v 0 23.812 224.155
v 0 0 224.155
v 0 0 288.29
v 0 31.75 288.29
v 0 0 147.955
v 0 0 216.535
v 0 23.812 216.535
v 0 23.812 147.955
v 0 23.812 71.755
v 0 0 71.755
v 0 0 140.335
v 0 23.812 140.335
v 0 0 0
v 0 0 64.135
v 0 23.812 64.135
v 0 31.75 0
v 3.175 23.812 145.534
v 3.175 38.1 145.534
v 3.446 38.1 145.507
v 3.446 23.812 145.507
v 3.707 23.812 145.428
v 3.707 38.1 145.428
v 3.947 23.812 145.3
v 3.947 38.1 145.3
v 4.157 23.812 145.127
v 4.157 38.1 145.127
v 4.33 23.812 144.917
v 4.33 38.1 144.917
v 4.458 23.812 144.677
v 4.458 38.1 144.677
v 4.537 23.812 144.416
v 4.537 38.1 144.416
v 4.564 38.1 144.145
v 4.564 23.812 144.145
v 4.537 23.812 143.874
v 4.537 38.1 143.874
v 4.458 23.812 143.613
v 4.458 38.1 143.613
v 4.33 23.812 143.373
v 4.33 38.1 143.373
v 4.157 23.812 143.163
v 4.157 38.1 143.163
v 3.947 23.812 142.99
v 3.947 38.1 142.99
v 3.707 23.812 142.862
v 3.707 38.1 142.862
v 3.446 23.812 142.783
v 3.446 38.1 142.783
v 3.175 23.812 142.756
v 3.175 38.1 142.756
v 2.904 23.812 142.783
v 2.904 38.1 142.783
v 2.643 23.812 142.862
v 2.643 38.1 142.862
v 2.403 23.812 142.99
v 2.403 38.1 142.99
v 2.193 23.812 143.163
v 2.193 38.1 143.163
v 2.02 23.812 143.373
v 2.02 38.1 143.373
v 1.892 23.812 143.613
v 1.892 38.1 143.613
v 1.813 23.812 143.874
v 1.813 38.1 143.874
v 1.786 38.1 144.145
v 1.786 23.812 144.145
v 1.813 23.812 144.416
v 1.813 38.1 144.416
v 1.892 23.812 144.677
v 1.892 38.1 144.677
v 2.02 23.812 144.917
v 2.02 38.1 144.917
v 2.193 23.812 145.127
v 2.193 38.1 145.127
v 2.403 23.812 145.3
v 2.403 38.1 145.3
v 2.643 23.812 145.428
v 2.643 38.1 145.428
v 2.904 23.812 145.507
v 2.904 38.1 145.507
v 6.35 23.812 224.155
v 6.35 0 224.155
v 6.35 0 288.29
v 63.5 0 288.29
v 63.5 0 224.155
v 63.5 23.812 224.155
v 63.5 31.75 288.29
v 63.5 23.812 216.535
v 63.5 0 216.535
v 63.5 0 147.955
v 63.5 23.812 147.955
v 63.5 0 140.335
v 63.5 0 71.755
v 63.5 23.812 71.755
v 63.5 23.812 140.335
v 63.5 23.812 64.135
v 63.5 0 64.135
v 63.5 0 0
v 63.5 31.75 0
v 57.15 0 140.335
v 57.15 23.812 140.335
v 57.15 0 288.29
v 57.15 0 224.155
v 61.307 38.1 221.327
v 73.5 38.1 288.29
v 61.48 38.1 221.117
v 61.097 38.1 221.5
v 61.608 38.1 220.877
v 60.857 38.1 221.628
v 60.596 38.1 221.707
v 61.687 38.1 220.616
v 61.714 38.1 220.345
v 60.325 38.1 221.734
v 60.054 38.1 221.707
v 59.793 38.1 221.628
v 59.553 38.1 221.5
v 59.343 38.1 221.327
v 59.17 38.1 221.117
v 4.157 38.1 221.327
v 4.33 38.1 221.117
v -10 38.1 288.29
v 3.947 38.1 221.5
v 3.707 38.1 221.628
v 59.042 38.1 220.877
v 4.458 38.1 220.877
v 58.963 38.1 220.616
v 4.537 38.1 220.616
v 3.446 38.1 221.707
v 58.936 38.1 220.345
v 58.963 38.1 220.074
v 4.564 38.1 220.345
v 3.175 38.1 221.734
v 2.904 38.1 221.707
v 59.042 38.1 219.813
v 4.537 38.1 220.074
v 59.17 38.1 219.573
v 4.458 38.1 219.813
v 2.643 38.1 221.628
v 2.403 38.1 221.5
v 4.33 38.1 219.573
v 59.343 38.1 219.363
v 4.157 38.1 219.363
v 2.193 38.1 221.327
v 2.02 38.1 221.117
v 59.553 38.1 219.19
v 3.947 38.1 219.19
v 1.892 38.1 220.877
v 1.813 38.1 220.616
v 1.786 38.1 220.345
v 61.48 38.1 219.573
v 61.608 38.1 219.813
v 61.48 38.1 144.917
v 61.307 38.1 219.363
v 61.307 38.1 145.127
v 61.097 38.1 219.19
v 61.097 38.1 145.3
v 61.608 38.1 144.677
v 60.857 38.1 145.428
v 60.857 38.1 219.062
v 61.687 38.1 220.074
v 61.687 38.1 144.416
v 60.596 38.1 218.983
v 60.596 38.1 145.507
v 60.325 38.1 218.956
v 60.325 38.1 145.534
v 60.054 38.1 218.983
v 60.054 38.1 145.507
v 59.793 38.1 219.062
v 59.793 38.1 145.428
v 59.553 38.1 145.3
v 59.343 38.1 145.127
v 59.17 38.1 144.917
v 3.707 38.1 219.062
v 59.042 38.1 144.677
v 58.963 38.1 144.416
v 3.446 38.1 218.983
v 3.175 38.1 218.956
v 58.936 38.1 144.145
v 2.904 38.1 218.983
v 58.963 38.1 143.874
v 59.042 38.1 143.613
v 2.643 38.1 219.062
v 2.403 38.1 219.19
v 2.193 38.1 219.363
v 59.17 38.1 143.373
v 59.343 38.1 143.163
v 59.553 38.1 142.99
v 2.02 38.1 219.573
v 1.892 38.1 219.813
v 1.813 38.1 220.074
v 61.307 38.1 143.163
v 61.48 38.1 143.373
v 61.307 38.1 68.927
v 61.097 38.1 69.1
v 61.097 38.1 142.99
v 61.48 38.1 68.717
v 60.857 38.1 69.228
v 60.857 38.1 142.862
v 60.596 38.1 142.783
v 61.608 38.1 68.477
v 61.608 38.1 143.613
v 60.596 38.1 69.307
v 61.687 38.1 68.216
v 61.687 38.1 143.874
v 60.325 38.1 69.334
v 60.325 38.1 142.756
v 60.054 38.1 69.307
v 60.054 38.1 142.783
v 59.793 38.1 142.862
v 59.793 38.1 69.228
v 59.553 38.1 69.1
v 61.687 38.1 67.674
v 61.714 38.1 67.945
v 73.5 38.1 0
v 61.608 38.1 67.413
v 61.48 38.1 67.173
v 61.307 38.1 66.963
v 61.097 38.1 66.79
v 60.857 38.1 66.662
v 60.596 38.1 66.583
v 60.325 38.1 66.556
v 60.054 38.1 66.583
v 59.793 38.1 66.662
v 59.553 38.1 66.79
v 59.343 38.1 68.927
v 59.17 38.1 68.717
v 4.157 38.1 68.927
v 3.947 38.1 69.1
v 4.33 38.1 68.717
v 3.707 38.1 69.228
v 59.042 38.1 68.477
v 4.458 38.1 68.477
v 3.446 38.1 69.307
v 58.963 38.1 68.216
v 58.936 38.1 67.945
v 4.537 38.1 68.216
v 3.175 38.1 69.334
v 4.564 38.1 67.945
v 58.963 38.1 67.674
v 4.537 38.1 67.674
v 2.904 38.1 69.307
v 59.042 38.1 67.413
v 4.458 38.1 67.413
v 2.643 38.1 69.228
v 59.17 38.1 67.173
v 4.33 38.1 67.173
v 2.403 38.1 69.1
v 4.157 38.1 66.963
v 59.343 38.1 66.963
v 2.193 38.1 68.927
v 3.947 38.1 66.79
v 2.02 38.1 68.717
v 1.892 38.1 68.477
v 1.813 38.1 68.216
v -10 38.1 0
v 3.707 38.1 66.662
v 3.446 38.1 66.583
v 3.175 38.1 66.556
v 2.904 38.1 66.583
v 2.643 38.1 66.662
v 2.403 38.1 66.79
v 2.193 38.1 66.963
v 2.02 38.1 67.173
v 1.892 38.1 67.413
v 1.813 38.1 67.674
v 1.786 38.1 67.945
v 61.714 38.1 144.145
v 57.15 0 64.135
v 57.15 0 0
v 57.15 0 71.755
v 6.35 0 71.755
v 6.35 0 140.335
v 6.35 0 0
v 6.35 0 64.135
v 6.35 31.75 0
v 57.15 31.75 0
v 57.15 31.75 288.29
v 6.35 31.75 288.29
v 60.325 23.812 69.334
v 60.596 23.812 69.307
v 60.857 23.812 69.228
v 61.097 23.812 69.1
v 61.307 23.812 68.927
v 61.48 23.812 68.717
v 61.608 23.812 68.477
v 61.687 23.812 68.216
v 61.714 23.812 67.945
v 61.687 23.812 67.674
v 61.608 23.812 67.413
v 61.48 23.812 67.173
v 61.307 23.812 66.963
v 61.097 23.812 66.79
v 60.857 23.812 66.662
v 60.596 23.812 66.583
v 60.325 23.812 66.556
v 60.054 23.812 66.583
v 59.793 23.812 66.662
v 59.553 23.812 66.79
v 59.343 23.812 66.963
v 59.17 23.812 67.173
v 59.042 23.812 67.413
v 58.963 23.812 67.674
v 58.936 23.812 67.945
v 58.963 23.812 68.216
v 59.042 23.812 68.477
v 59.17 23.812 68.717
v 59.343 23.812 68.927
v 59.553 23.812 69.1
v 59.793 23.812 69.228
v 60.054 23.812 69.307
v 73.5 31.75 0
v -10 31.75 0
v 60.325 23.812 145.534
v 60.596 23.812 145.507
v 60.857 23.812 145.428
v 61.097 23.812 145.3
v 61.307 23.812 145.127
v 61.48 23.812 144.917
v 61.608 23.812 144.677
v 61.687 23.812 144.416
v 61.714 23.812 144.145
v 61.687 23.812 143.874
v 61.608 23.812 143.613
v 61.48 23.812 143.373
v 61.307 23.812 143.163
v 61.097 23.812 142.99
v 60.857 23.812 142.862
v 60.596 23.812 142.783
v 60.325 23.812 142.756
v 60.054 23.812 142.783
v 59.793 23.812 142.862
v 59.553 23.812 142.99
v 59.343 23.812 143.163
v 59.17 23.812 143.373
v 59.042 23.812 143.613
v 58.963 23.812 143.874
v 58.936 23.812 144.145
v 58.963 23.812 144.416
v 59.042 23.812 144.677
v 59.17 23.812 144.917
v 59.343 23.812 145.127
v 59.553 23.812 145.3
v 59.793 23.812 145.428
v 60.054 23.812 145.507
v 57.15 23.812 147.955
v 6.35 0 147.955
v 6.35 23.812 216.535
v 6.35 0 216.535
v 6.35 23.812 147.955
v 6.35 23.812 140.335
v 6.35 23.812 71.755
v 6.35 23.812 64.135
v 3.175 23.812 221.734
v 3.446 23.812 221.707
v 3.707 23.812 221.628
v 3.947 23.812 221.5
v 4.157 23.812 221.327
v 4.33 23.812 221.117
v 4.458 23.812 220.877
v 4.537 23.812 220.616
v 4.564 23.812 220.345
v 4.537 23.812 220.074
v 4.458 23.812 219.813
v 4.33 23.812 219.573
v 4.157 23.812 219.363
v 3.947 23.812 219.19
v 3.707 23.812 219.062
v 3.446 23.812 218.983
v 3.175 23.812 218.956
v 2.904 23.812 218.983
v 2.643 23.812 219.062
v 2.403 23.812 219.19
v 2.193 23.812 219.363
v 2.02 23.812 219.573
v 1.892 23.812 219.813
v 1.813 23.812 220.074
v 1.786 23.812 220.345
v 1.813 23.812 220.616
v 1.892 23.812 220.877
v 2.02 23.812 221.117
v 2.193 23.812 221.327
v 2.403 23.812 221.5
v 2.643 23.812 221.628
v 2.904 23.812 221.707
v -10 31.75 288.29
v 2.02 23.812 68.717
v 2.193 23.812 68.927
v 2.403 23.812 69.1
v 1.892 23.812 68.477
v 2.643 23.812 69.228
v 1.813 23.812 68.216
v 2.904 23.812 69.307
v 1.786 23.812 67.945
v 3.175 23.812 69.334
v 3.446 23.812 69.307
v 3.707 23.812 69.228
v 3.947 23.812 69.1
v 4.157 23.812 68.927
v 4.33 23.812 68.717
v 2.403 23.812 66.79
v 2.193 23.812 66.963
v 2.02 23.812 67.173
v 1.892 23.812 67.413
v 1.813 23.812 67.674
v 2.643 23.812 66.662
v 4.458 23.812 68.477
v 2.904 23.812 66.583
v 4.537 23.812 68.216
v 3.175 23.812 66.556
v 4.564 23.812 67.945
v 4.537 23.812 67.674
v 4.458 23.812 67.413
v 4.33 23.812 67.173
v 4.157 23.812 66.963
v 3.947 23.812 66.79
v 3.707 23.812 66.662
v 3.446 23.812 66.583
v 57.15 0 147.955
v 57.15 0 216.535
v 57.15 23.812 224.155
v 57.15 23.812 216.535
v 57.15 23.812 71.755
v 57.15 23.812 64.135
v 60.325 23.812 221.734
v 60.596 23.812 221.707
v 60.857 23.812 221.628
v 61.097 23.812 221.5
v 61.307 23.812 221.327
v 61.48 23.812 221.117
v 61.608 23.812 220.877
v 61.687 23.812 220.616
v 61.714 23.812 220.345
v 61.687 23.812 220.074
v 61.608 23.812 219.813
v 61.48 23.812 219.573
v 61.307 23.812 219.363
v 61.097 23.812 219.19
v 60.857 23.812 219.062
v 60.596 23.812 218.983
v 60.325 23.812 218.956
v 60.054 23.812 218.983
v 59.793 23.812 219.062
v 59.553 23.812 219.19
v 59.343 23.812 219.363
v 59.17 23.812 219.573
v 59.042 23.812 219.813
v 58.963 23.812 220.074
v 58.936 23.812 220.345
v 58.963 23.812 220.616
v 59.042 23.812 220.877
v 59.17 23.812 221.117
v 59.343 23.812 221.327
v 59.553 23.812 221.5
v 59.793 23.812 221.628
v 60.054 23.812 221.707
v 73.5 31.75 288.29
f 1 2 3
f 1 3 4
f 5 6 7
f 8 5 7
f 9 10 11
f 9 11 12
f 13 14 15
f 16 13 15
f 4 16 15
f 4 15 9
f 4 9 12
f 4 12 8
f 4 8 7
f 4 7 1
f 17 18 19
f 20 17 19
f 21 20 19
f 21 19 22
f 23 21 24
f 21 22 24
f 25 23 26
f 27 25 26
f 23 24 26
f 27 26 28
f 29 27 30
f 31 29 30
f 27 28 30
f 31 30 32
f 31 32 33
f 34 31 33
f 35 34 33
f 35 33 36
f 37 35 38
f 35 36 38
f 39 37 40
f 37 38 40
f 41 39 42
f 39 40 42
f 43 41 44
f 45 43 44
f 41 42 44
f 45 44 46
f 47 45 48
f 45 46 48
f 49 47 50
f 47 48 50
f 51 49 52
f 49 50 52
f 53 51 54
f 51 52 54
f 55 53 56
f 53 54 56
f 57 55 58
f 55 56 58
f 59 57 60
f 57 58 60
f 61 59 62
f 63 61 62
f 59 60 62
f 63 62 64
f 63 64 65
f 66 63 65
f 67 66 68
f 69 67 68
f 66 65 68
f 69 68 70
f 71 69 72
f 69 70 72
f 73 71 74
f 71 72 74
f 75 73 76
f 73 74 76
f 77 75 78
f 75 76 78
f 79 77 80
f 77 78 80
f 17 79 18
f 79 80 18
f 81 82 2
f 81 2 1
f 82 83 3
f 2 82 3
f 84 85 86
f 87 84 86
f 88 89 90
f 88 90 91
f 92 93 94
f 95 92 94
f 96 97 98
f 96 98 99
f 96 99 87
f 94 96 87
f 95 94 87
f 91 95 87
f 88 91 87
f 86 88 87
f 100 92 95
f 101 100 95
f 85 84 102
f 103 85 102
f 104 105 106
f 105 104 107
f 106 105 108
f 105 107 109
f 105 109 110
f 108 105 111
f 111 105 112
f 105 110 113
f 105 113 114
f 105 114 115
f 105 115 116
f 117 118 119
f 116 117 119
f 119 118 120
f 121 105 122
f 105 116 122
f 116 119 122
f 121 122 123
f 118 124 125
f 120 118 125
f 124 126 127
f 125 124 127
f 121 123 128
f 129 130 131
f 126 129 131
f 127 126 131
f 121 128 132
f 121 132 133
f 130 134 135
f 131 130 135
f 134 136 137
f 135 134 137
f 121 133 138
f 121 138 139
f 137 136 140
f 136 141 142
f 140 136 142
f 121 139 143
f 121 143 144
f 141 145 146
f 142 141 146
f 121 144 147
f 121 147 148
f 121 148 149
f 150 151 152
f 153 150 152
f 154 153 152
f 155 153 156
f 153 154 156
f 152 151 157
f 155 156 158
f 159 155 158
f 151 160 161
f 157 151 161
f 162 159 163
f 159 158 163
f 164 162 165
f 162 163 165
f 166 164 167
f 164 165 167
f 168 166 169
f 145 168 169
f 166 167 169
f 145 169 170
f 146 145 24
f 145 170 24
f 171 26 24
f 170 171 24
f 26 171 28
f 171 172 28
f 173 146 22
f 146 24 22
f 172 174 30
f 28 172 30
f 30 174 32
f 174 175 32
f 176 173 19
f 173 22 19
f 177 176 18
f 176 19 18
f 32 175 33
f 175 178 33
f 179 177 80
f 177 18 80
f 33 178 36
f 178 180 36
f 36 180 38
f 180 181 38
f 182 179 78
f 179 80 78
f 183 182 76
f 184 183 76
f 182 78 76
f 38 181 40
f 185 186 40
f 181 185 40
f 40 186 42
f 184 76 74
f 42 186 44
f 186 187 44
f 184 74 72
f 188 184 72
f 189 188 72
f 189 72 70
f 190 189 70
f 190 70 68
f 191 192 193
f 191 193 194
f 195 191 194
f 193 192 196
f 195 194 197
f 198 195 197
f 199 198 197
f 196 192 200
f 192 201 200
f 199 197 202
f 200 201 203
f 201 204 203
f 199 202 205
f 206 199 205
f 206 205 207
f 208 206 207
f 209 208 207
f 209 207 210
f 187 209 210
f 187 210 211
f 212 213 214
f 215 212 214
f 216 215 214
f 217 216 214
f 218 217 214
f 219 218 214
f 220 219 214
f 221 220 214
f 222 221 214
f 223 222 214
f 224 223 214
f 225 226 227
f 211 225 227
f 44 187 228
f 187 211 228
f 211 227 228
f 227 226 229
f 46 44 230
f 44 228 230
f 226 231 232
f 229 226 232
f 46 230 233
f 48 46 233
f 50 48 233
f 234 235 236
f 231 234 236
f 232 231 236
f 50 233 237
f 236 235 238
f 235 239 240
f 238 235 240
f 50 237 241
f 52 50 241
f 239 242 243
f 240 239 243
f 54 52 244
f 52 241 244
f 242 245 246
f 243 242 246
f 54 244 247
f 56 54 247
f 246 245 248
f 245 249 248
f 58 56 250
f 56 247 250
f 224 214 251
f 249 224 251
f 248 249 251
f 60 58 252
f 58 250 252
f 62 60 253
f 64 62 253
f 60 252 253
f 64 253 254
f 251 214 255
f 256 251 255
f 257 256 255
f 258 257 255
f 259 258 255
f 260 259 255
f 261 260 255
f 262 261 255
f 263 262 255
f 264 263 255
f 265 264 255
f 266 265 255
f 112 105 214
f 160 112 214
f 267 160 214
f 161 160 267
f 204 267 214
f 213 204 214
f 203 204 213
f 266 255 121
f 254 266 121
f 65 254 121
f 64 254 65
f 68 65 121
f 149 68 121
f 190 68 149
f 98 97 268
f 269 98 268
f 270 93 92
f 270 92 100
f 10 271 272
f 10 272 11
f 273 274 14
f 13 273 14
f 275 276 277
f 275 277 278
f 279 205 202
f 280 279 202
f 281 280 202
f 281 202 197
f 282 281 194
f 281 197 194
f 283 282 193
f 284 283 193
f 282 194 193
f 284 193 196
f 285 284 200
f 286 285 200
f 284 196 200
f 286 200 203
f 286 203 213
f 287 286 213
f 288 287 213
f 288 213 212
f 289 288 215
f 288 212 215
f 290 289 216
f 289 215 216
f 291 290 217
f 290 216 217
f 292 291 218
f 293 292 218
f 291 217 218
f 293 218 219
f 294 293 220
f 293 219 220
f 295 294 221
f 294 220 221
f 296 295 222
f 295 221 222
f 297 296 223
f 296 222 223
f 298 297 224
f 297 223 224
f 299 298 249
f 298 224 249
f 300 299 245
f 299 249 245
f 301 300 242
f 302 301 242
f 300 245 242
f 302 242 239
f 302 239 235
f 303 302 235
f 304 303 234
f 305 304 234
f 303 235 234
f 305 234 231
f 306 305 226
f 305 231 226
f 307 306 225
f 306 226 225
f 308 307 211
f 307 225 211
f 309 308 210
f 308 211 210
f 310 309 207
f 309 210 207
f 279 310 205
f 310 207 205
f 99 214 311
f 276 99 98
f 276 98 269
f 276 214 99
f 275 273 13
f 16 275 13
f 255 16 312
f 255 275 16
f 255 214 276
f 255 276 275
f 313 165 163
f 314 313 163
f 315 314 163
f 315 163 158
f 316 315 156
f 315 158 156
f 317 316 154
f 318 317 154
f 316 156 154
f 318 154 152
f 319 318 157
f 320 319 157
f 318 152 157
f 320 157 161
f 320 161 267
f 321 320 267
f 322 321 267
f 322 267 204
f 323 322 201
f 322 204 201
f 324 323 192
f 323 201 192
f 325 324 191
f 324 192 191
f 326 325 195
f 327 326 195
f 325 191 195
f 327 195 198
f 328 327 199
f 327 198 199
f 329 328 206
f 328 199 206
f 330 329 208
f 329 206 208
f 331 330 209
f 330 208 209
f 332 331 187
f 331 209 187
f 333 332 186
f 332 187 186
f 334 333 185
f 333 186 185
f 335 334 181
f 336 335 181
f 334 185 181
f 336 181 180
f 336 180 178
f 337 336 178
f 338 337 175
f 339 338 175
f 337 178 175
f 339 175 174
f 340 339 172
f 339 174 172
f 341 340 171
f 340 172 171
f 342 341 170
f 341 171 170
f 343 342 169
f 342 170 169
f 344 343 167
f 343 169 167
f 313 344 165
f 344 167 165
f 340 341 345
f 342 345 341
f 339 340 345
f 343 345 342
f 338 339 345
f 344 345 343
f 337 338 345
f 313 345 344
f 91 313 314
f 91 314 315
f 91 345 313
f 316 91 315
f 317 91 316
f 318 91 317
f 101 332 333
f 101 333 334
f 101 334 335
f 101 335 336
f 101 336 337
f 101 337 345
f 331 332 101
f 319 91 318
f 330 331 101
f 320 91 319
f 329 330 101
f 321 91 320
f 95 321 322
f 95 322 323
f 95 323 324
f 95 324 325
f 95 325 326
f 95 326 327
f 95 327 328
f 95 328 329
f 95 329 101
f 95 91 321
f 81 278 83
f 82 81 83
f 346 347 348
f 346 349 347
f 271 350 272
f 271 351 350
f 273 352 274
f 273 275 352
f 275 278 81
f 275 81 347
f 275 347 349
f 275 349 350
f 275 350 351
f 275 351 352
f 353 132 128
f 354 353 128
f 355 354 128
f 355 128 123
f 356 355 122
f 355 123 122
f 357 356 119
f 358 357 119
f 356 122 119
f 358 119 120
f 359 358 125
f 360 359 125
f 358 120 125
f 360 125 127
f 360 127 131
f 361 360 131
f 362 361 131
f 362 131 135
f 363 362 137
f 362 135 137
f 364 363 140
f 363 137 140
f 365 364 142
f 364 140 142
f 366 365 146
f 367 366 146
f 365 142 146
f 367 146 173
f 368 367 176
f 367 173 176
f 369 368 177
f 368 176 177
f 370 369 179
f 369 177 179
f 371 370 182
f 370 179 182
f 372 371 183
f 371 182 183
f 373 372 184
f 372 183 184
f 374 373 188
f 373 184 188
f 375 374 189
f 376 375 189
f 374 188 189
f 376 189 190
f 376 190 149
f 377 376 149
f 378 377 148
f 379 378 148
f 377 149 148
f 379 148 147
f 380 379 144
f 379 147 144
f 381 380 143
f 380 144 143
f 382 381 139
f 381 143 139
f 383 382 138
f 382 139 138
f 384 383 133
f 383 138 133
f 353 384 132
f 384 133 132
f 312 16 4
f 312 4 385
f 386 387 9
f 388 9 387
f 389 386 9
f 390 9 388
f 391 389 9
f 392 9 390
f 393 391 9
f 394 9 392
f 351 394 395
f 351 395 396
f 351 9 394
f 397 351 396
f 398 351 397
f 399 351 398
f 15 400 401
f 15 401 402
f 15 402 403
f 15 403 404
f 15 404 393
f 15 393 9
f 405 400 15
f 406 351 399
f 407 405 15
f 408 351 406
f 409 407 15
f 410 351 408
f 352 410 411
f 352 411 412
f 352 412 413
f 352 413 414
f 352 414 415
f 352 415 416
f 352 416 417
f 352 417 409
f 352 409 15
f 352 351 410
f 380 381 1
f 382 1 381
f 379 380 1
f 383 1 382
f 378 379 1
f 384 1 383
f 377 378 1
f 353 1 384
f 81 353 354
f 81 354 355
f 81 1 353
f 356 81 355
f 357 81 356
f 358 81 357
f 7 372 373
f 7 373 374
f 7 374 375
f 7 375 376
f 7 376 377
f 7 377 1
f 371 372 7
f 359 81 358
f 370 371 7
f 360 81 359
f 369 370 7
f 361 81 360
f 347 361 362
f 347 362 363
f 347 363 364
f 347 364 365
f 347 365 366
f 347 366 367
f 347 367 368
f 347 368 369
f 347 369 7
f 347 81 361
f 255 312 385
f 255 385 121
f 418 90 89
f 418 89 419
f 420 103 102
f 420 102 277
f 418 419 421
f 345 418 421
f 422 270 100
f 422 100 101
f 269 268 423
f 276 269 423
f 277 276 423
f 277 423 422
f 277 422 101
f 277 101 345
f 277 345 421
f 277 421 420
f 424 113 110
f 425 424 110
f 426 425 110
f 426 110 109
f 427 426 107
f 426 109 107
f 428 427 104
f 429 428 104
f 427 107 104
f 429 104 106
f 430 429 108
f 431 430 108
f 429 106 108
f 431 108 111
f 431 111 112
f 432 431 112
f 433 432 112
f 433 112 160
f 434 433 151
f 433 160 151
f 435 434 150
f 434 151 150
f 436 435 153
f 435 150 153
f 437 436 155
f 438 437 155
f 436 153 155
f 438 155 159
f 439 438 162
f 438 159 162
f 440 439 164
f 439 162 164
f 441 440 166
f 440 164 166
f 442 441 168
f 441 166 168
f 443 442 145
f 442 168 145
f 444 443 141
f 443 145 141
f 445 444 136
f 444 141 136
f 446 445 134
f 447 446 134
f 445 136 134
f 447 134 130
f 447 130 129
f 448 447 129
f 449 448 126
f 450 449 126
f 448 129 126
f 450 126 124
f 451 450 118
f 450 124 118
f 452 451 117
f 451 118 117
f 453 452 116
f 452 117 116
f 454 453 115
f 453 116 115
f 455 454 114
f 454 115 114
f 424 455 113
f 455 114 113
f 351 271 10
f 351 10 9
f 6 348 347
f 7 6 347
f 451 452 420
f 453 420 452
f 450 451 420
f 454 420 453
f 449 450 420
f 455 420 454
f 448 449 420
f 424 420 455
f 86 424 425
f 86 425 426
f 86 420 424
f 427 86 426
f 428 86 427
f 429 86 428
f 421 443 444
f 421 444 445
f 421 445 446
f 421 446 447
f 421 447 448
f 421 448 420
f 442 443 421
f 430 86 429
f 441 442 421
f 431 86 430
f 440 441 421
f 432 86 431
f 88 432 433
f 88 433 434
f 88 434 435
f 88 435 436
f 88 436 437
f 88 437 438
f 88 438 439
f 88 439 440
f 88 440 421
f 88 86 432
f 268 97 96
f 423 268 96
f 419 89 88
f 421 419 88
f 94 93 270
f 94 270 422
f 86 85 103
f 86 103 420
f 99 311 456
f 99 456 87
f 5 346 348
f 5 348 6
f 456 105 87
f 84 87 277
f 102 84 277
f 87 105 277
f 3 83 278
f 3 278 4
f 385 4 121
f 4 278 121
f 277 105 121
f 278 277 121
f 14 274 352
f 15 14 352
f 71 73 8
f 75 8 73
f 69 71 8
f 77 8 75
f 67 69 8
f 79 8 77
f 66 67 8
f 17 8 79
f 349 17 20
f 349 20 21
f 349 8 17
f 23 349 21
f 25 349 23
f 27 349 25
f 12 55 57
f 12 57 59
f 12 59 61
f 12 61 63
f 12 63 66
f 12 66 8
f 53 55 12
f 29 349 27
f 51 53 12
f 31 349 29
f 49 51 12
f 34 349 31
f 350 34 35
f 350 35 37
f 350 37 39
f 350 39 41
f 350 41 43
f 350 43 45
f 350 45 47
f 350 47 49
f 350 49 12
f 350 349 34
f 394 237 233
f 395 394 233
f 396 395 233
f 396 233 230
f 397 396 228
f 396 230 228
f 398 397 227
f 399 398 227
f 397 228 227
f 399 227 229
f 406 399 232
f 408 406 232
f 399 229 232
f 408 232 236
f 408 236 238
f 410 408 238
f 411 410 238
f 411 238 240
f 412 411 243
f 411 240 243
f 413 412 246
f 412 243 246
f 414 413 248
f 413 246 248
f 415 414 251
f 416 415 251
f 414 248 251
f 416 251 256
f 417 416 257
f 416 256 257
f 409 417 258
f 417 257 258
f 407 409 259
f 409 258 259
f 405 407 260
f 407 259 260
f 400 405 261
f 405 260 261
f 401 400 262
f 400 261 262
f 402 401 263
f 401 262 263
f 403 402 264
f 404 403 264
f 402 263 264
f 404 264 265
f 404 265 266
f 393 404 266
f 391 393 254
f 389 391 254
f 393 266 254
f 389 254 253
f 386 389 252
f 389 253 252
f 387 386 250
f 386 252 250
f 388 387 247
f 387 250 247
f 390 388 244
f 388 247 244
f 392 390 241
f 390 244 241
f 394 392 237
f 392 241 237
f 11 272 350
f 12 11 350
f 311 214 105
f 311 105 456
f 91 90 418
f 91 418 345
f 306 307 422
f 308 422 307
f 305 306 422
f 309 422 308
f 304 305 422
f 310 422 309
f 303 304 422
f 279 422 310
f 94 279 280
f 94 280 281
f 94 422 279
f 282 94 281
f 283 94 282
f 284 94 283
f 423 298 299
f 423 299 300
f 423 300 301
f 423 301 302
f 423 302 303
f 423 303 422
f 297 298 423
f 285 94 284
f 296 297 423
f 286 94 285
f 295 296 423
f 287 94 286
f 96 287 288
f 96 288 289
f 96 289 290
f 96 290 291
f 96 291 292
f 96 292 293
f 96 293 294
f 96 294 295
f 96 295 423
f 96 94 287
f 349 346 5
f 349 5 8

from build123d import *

# Parameters (mm, degrees)
BOSS_EXTRUDE1_DEPTH = 288.29
CUT_EXTRUDE2_REACH  = 301.942
SKETCH4_W           = 7.62
SKETCH4_H           = 23.8125
LPATTERN1_COUNT     = 3
LPATTERN1_PITCH     = 76.2
SKETCH5_R           = 1.3890625
CUT_EXTRUDE3_DEPTH  = 14.2875
LPATTERN2_COUNT     = 3
LPATTERN2_PITCH     = 76.2


with BuildPart() as part:
    # Sketch1 → Boss-Extrude1 (new body)
    with BuildSketch(Plane.XY):
        Polygon((57.15, 0), (57.15, 31.75), (6.35, 31.75), (6.35, 0), (0, 0), (0, 31.75), (-10, 31.75), (-10, 38.1), (0, 38.1), (63.5, 38.1), (73.5, 38.1), (73.5, 31.75), (63.5, 31.75), (63.5, 9.525), (63.5, 0), align=None)
    extrude(amount=BOSS_EXTRUDE1_DEPTH)

    # Cut-Extrude2: up to this face of the body (flat: up to its plane)
    cut_extrude2_end = Plane(part.part.faces().sort_by_distance((0, 15.875, 144.145))[0])
    # Sketch4 → Cut-Extrude2 (cut, up to the picked face)
    with BuildSketch(Plane(origin=(63.5, 0, 0), x_dir=(0, 0, -1), z_dir=(1, 0, 0)), mode=Mode.PRIVATE) as cut_extrude2_sk1:
        with Locations((-220.345, 11.90625)):
            Rectangle(SKETCH4_W, SKETCH4_H)
    cut_extrude2_tool1 = split(extrude(cut_extrude2_sk1.sketch, amount=-CUT_EXTRUDE2_REACH, mode=Mode.PRIVATE), bisect_by=cut_extrude2_end, keep=Keep.BOTH, mode=Mode.PRIVATE)
    cut_extrude2 = cut_extrude2_tool1.solids().sort_by(Axis((63.5, 11.90625, 220.345), (-1, 0, 0)))[0]
    add(cut_extrude2, mode=Mode.SUBTRACT)

    # LPattern1: Cut-Extrude2 ×3
    with Locations(*[(0, 0, -i * LPATTERN1_PITCH) for i in range(1, LPATTERN1_COUNT)]):
        add(cut_extrude2, mode=Mode.SUBTRACT)

    # Sketch5 → Cut-Extrude3 (cut)
    with BuildSketch(Plane(origin=(0, 38.1, 0), x_dir=(1, 0, 0), z_dir=(0, 1, 0))):
        with Locations(Location((60.325, -220.345, 0), (0, 0, 270))):
            Circle(SKETCH5_R)
        with Locations(Location((3.175, -220.345, 0), (0, 0, 270))):
            Circle(SKETCH5_R)
    cut_extrude3 = extrude(amount=-CUT_EXTRUDE3_DEPTH, mode=Mode.SUBTRACT)

    # LPattern2: Cut-Extrude3 ×3
    with Locations(*[(0, 0, -i * LPATTERN2_PITCH) for i in range(1, LPATTERN2_COUNT)]):
        add(cut_extrude3, mode=Mode.SUBTRACT)


solid = part.part
